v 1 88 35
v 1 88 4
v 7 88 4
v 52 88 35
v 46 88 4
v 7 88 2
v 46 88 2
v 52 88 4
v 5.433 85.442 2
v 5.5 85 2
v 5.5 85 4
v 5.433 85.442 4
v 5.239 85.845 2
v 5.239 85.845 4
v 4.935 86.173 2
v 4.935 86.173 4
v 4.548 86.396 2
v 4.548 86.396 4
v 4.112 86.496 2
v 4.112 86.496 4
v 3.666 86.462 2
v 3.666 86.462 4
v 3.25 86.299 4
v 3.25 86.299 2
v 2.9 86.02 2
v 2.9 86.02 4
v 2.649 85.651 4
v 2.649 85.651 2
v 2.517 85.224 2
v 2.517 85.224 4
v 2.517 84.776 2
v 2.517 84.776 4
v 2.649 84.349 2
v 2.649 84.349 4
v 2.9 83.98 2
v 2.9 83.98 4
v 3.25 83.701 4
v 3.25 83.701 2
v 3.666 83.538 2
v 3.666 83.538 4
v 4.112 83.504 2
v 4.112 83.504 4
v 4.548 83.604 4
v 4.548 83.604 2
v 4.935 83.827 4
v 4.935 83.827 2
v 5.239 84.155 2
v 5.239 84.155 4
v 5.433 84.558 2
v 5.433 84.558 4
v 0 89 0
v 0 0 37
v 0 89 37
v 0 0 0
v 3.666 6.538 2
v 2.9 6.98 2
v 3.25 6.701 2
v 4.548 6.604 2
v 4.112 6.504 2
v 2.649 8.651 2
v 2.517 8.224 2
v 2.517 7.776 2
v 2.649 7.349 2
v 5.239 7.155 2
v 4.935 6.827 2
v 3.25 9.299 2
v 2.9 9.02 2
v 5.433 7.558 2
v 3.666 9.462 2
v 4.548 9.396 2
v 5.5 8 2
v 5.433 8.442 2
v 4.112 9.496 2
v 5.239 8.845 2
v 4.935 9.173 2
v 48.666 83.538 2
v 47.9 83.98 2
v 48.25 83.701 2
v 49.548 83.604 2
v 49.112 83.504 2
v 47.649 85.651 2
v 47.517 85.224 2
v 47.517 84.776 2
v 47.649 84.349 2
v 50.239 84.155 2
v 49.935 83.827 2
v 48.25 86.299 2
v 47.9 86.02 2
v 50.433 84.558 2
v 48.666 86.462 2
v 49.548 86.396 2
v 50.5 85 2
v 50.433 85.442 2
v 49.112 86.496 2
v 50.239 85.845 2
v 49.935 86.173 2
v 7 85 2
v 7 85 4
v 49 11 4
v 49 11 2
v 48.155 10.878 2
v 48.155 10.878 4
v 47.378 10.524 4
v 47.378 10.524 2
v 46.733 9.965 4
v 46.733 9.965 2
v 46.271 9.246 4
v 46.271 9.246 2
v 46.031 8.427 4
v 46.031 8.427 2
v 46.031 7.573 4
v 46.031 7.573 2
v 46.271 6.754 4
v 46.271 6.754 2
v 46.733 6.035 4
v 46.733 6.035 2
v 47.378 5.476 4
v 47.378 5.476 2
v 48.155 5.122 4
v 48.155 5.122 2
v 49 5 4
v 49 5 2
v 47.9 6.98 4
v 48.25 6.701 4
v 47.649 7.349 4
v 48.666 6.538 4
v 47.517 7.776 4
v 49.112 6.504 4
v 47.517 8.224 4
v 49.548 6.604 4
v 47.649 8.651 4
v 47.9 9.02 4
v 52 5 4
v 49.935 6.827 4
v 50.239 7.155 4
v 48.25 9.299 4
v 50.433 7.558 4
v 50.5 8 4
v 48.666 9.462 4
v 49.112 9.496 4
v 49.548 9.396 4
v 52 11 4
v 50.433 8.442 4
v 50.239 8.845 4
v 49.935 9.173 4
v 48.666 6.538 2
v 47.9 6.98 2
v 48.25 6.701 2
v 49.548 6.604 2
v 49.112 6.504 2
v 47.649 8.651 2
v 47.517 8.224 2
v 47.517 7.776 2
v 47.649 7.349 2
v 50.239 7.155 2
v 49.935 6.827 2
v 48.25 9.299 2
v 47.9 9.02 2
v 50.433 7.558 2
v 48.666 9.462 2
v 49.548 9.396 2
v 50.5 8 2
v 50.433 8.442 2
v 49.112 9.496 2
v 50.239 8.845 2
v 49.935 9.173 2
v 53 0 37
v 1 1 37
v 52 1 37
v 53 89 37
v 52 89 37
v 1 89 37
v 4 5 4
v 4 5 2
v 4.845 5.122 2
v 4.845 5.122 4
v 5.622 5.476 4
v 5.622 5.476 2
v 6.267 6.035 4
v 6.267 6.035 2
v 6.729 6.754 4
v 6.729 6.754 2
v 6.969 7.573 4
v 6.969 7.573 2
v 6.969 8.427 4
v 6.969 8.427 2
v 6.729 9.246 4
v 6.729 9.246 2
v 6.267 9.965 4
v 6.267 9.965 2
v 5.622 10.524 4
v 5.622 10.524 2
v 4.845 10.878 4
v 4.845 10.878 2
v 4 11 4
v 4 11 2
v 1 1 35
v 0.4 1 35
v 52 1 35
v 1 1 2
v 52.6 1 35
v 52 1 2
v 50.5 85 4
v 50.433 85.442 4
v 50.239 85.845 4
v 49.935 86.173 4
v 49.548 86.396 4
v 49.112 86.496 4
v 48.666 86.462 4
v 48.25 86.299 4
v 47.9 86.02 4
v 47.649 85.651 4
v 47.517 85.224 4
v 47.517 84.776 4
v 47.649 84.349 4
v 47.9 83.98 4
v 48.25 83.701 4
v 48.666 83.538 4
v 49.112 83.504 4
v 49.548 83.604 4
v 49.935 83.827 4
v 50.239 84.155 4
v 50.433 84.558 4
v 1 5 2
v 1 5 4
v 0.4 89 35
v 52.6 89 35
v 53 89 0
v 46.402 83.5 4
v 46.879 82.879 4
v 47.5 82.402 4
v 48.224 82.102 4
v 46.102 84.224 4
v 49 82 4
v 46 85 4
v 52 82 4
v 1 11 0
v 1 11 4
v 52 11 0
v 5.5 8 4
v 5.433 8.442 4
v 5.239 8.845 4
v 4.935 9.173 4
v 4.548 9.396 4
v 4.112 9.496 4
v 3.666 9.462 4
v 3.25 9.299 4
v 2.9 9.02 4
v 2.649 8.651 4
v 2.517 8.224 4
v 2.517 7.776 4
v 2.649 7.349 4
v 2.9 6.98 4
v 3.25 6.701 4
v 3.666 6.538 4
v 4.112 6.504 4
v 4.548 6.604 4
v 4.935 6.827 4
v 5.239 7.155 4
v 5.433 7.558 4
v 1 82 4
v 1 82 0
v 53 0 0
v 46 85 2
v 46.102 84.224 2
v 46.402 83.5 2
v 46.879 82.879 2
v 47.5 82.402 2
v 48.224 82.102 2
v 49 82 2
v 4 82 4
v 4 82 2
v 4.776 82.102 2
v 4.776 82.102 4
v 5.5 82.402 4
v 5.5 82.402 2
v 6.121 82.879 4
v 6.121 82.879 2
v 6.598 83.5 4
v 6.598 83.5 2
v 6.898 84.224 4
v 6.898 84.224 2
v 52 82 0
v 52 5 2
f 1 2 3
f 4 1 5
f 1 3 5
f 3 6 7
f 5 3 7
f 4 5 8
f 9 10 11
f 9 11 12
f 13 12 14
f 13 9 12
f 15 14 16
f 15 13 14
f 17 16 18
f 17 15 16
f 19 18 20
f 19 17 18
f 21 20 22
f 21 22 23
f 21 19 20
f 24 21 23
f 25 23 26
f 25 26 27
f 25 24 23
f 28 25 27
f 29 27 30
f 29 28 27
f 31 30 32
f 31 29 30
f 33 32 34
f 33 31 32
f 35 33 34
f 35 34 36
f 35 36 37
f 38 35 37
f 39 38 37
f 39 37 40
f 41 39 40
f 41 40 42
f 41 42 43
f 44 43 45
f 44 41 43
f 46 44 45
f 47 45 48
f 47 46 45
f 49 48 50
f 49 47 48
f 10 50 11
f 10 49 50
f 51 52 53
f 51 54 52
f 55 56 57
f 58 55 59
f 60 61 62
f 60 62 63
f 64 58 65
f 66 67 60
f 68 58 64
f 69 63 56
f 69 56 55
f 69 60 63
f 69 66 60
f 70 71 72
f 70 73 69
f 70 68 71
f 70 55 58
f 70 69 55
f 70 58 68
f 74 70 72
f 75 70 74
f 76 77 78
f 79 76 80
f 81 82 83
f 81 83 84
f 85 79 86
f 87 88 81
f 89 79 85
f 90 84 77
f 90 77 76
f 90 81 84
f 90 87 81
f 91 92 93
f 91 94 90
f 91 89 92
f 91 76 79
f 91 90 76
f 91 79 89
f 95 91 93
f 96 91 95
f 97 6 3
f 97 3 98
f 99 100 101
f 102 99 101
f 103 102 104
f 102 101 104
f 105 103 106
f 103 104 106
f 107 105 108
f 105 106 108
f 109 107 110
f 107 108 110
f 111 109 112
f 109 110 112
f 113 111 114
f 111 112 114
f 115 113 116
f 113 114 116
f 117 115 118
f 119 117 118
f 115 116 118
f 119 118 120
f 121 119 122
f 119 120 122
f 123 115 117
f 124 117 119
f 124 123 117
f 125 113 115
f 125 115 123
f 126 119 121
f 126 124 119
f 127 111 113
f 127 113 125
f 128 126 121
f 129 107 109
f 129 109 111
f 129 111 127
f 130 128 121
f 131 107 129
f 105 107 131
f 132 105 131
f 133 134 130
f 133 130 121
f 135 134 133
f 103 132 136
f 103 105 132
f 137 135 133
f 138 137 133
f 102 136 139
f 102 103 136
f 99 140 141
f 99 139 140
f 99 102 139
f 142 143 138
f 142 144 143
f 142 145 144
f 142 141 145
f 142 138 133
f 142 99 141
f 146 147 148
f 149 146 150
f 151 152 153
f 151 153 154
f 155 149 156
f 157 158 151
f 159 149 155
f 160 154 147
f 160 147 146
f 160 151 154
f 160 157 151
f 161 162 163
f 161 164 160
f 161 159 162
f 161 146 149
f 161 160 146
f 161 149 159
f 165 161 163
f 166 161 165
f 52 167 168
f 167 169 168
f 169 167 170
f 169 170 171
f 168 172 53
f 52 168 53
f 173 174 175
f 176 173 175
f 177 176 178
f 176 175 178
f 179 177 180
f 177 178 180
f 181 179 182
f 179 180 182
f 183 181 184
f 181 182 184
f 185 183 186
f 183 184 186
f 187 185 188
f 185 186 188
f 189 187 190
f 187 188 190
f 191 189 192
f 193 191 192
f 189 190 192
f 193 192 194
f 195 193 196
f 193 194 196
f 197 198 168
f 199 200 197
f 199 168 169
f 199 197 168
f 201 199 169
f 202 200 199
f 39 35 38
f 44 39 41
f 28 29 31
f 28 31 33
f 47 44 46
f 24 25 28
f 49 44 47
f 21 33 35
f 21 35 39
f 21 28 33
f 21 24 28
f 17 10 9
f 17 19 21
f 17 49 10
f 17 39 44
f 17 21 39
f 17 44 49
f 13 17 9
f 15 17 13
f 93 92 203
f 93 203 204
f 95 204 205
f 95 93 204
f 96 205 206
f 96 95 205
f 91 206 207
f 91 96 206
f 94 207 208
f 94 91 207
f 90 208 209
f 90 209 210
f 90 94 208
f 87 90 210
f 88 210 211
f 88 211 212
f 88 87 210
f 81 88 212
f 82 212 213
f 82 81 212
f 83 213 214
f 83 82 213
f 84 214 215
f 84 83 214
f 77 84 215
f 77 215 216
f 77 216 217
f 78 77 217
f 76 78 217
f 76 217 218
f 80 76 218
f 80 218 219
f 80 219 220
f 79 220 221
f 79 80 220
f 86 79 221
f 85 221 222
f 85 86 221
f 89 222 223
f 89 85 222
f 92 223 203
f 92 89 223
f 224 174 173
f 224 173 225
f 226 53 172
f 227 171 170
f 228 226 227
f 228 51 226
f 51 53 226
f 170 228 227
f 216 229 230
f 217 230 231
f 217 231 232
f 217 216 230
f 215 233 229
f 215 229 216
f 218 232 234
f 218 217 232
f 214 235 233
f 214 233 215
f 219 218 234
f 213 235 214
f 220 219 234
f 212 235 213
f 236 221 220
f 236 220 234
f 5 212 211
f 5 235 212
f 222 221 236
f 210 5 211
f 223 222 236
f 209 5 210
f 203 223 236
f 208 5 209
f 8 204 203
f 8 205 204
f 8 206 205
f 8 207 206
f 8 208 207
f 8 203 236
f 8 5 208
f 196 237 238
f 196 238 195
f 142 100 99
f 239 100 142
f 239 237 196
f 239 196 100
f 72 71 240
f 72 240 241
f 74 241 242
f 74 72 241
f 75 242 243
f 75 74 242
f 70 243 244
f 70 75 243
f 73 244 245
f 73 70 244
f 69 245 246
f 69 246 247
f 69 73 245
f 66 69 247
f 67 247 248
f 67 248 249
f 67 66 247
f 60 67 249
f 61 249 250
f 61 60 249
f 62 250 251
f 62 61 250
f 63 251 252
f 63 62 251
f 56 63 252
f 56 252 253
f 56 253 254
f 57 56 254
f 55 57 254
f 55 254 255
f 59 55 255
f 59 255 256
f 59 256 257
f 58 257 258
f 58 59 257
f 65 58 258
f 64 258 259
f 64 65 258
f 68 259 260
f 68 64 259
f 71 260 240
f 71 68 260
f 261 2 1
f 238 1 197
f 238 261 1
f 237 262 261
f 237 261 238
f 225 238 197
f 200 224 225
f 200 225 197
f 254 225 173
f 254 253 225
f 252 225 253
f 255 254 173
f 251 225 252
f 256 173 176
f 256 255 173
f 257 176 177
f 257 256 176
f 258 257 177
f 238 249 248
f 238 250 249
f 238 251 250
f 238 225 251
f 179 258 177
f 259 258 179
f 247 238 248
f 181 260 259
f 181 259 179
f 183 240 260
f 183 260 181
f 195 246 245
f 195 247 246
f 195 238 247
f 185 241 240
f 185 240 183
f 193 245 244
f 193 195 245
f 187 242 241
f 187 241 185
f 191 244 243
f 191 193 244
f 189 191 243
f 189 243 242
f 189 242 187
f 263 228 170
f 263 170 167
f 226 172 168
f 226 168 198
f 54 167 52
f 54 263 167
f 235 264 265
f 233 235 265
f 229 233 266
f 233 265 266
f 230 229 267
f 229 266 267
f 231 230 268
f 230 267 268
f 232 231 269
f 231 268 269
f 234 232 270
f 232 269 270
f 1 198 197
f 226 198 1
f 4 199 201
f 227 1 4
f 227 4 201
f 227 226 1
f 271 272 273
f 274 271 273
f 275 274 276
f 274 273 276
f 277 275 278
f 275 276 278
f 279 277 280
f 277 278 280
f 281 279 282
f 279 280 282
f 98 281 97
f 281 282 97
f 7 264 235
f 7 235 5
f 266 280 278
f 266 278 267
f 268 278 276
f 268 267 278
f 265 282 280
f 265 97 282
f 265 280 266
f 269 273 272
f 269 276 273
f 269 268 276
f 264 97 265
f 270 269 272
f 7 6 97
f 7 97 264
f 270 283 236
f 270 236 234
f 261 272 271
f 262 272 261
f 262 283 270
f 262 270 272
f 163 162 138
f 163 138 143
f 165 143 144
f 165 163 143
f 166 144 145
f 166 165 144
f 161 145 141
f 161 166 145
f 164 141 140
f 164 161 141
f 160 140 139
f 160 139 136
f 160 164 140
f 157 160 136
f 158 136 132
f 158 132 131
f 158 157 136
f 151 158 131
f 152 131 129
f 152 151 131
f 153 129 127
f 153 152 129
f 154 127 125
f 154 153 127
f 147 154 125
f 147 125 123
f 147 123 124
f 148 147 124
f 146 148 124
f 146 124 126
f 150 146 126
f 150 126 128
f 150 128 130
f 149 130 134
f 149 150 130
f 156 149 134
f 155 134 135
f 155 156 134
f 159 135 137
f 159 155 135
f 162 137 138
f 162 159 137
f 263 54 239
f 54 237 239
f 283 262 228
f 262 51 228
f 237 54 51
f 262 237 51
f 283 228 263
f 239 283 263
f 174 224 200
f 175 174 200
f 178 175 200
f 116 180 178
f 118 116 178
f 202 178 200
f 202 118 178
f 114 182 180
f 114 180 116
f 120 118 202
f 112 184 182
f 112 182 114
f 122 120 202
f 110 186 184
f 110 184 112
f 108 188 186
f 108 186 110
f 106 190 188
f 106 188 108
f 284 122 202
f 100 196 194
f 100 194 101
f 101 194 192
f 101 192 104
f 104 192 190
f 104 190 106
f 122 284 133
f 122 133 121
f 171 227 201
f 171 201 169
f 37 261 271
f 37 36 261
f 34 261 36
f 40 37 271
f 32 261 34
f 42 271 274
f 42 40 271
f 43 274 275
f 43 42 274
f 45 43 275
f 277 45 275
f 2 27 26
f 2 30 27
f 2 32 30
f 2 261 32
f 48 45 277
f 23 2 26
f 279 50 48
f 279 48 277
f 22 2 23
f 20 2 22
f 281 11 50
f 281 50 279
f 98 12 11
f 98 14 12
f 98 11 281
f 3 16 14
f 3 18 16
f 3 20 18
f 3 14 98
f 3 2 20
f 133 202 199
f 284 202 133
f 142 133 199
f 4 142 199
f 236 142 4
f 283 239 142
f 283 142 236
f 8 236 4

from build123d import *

# Parameters (mm, degrees)
SKETCH_W        = 53
SKETCH_H        = 89
PAD_DEPTH       = 2
SKETCH001_W     = 51
SKETCH001_H     = 71
POCKET_DEPTH    = 2
SKETCH002_W     = 53
SKETCH002_H     = 89
SKETCH002_W_2   = 51
SKETCH002_H_2   = 87
PAD001_DEPTH    = 33
SKETCH003_R     = 1.5
PAD002_DEPTH    = 2
PAD003_DEPTH    = 2
POCKET001_DEPTH = 88


with BuildPart() as part:
    # Sketch → Pad (new body)
    with BuildSketch(Plane.XY):
        with Locations((26.5, 44.5)):
            Rectangle(SKETCH_W, SKETCH_H)
    extrude(amount=PAD_DEPTH)

    # Sketch001 (on Face6 of Pad) → Pocket (cut)
    with BuildSketch(Plane.XY.offset(2)):
        with Locations((26.5, 46.5)):
            Rectangle(SKETCH001_W, SKETCH001_H)
    extrude(amount=-POCKET_DEPTH, mode=Mode.SUBTRACT)

    # Sketch002 (on Face5 of Pocket) → Pad001 (join)
    with BuildSketch(Plane.XY.offset(2)):
        with Locations((26.5, 44.5)):
            Rectangle(SKETCH002_W, SKETCH002_H)
        with Locations((26.5, 44.5)):
            Rectangle(SKETCH002_W_2, SKETCH002_H_2, mode=Mode.SUBTRACT)
    extrude(amount=PAD001_DEPTH)

    # Sketch003 (on Face15 of Pad001) → Pad002 (join)
    with BuildSketch(Plane.XY.offset(2)):
        with BuildLine():
            ThreePointArc((4, 82), (6.12132, 82.87868), (7, 85))
            Line((7, 88), (7, 85))
            Line((1, 88), (7, 88))
            Line((1, 82), (1, 88))
            Line((4, 82), (1, 82))
        make_face()
        with Locations((4, 85)):
            Circle(SKETCH003_R, mode=Mode.SUBTRACT)
        with BuildLine():
            ThreePointArc((46, 85), (46.87868, 82.87868), (49, 82))
            Line((52, 82), (49, 82))
            Line((52, 88), (52, 82))
            Line((46, 88), (52, 88))
            Line((46, 85), (46, 88))
        make_face()
        with Locations((49, 85)):
            Circle(SKETCH003_R, mode=Mode.SUBTRACT)
        with BuildLine():
            ThreePointArc((49, 11), (46, 8), (49, 5))
            Line((52, 5), (49, 5))
            Line((52, 11), (52, 5))
            Line((49, 11), (52, 11))
        make_face()
        with Locations((49, 8)):
            Circle(SKETCH003_R, mode=Mode.SUBTRACT)
        with BuildLine():
            ThreePointArc((4, 5), (7, 8), (4, 11))
            Line((1, 11), (4, 11))
            Line((1, 5), (1, 11))
            Line((4, 5), (1, 5))
        make_face()
        with Locations((4, 8)):
            Circle(SKETCH003_R, mode=Mode.SUBTRACT)
    extrude(amount=PAD002_DEPTH)

    # Sketch004 (on Face13 of Pad002) → Pad003 (join)
    with BuildSketch(Plane.XY.offset(35)):
        Polygon((0, 0), (0, 89), (1, 89), (1, 1), (52, 1), (52, 89), (53, 89), (53, 0), align=None)
    extrude(amount=PAD003_DEPTH)

    # Sketch005 (on Face28 of Pad003) → Pocket001 (cut)
    with BuildSketch(Plane(origin=(0, 89, 0), x_dir=(-1, 0, 0), z_dir=(0, 1, 0))):
        Polygon((-52.6, 35), (-52, 37), (-52, 35), align=None)
        Polygon((-1, 35), (-1, 37), (-0.4, 35), align=None)
    extrude(amount=-POCKET001_DEPTH, mode=Mode.SUBTRACT)


solid = part.part
